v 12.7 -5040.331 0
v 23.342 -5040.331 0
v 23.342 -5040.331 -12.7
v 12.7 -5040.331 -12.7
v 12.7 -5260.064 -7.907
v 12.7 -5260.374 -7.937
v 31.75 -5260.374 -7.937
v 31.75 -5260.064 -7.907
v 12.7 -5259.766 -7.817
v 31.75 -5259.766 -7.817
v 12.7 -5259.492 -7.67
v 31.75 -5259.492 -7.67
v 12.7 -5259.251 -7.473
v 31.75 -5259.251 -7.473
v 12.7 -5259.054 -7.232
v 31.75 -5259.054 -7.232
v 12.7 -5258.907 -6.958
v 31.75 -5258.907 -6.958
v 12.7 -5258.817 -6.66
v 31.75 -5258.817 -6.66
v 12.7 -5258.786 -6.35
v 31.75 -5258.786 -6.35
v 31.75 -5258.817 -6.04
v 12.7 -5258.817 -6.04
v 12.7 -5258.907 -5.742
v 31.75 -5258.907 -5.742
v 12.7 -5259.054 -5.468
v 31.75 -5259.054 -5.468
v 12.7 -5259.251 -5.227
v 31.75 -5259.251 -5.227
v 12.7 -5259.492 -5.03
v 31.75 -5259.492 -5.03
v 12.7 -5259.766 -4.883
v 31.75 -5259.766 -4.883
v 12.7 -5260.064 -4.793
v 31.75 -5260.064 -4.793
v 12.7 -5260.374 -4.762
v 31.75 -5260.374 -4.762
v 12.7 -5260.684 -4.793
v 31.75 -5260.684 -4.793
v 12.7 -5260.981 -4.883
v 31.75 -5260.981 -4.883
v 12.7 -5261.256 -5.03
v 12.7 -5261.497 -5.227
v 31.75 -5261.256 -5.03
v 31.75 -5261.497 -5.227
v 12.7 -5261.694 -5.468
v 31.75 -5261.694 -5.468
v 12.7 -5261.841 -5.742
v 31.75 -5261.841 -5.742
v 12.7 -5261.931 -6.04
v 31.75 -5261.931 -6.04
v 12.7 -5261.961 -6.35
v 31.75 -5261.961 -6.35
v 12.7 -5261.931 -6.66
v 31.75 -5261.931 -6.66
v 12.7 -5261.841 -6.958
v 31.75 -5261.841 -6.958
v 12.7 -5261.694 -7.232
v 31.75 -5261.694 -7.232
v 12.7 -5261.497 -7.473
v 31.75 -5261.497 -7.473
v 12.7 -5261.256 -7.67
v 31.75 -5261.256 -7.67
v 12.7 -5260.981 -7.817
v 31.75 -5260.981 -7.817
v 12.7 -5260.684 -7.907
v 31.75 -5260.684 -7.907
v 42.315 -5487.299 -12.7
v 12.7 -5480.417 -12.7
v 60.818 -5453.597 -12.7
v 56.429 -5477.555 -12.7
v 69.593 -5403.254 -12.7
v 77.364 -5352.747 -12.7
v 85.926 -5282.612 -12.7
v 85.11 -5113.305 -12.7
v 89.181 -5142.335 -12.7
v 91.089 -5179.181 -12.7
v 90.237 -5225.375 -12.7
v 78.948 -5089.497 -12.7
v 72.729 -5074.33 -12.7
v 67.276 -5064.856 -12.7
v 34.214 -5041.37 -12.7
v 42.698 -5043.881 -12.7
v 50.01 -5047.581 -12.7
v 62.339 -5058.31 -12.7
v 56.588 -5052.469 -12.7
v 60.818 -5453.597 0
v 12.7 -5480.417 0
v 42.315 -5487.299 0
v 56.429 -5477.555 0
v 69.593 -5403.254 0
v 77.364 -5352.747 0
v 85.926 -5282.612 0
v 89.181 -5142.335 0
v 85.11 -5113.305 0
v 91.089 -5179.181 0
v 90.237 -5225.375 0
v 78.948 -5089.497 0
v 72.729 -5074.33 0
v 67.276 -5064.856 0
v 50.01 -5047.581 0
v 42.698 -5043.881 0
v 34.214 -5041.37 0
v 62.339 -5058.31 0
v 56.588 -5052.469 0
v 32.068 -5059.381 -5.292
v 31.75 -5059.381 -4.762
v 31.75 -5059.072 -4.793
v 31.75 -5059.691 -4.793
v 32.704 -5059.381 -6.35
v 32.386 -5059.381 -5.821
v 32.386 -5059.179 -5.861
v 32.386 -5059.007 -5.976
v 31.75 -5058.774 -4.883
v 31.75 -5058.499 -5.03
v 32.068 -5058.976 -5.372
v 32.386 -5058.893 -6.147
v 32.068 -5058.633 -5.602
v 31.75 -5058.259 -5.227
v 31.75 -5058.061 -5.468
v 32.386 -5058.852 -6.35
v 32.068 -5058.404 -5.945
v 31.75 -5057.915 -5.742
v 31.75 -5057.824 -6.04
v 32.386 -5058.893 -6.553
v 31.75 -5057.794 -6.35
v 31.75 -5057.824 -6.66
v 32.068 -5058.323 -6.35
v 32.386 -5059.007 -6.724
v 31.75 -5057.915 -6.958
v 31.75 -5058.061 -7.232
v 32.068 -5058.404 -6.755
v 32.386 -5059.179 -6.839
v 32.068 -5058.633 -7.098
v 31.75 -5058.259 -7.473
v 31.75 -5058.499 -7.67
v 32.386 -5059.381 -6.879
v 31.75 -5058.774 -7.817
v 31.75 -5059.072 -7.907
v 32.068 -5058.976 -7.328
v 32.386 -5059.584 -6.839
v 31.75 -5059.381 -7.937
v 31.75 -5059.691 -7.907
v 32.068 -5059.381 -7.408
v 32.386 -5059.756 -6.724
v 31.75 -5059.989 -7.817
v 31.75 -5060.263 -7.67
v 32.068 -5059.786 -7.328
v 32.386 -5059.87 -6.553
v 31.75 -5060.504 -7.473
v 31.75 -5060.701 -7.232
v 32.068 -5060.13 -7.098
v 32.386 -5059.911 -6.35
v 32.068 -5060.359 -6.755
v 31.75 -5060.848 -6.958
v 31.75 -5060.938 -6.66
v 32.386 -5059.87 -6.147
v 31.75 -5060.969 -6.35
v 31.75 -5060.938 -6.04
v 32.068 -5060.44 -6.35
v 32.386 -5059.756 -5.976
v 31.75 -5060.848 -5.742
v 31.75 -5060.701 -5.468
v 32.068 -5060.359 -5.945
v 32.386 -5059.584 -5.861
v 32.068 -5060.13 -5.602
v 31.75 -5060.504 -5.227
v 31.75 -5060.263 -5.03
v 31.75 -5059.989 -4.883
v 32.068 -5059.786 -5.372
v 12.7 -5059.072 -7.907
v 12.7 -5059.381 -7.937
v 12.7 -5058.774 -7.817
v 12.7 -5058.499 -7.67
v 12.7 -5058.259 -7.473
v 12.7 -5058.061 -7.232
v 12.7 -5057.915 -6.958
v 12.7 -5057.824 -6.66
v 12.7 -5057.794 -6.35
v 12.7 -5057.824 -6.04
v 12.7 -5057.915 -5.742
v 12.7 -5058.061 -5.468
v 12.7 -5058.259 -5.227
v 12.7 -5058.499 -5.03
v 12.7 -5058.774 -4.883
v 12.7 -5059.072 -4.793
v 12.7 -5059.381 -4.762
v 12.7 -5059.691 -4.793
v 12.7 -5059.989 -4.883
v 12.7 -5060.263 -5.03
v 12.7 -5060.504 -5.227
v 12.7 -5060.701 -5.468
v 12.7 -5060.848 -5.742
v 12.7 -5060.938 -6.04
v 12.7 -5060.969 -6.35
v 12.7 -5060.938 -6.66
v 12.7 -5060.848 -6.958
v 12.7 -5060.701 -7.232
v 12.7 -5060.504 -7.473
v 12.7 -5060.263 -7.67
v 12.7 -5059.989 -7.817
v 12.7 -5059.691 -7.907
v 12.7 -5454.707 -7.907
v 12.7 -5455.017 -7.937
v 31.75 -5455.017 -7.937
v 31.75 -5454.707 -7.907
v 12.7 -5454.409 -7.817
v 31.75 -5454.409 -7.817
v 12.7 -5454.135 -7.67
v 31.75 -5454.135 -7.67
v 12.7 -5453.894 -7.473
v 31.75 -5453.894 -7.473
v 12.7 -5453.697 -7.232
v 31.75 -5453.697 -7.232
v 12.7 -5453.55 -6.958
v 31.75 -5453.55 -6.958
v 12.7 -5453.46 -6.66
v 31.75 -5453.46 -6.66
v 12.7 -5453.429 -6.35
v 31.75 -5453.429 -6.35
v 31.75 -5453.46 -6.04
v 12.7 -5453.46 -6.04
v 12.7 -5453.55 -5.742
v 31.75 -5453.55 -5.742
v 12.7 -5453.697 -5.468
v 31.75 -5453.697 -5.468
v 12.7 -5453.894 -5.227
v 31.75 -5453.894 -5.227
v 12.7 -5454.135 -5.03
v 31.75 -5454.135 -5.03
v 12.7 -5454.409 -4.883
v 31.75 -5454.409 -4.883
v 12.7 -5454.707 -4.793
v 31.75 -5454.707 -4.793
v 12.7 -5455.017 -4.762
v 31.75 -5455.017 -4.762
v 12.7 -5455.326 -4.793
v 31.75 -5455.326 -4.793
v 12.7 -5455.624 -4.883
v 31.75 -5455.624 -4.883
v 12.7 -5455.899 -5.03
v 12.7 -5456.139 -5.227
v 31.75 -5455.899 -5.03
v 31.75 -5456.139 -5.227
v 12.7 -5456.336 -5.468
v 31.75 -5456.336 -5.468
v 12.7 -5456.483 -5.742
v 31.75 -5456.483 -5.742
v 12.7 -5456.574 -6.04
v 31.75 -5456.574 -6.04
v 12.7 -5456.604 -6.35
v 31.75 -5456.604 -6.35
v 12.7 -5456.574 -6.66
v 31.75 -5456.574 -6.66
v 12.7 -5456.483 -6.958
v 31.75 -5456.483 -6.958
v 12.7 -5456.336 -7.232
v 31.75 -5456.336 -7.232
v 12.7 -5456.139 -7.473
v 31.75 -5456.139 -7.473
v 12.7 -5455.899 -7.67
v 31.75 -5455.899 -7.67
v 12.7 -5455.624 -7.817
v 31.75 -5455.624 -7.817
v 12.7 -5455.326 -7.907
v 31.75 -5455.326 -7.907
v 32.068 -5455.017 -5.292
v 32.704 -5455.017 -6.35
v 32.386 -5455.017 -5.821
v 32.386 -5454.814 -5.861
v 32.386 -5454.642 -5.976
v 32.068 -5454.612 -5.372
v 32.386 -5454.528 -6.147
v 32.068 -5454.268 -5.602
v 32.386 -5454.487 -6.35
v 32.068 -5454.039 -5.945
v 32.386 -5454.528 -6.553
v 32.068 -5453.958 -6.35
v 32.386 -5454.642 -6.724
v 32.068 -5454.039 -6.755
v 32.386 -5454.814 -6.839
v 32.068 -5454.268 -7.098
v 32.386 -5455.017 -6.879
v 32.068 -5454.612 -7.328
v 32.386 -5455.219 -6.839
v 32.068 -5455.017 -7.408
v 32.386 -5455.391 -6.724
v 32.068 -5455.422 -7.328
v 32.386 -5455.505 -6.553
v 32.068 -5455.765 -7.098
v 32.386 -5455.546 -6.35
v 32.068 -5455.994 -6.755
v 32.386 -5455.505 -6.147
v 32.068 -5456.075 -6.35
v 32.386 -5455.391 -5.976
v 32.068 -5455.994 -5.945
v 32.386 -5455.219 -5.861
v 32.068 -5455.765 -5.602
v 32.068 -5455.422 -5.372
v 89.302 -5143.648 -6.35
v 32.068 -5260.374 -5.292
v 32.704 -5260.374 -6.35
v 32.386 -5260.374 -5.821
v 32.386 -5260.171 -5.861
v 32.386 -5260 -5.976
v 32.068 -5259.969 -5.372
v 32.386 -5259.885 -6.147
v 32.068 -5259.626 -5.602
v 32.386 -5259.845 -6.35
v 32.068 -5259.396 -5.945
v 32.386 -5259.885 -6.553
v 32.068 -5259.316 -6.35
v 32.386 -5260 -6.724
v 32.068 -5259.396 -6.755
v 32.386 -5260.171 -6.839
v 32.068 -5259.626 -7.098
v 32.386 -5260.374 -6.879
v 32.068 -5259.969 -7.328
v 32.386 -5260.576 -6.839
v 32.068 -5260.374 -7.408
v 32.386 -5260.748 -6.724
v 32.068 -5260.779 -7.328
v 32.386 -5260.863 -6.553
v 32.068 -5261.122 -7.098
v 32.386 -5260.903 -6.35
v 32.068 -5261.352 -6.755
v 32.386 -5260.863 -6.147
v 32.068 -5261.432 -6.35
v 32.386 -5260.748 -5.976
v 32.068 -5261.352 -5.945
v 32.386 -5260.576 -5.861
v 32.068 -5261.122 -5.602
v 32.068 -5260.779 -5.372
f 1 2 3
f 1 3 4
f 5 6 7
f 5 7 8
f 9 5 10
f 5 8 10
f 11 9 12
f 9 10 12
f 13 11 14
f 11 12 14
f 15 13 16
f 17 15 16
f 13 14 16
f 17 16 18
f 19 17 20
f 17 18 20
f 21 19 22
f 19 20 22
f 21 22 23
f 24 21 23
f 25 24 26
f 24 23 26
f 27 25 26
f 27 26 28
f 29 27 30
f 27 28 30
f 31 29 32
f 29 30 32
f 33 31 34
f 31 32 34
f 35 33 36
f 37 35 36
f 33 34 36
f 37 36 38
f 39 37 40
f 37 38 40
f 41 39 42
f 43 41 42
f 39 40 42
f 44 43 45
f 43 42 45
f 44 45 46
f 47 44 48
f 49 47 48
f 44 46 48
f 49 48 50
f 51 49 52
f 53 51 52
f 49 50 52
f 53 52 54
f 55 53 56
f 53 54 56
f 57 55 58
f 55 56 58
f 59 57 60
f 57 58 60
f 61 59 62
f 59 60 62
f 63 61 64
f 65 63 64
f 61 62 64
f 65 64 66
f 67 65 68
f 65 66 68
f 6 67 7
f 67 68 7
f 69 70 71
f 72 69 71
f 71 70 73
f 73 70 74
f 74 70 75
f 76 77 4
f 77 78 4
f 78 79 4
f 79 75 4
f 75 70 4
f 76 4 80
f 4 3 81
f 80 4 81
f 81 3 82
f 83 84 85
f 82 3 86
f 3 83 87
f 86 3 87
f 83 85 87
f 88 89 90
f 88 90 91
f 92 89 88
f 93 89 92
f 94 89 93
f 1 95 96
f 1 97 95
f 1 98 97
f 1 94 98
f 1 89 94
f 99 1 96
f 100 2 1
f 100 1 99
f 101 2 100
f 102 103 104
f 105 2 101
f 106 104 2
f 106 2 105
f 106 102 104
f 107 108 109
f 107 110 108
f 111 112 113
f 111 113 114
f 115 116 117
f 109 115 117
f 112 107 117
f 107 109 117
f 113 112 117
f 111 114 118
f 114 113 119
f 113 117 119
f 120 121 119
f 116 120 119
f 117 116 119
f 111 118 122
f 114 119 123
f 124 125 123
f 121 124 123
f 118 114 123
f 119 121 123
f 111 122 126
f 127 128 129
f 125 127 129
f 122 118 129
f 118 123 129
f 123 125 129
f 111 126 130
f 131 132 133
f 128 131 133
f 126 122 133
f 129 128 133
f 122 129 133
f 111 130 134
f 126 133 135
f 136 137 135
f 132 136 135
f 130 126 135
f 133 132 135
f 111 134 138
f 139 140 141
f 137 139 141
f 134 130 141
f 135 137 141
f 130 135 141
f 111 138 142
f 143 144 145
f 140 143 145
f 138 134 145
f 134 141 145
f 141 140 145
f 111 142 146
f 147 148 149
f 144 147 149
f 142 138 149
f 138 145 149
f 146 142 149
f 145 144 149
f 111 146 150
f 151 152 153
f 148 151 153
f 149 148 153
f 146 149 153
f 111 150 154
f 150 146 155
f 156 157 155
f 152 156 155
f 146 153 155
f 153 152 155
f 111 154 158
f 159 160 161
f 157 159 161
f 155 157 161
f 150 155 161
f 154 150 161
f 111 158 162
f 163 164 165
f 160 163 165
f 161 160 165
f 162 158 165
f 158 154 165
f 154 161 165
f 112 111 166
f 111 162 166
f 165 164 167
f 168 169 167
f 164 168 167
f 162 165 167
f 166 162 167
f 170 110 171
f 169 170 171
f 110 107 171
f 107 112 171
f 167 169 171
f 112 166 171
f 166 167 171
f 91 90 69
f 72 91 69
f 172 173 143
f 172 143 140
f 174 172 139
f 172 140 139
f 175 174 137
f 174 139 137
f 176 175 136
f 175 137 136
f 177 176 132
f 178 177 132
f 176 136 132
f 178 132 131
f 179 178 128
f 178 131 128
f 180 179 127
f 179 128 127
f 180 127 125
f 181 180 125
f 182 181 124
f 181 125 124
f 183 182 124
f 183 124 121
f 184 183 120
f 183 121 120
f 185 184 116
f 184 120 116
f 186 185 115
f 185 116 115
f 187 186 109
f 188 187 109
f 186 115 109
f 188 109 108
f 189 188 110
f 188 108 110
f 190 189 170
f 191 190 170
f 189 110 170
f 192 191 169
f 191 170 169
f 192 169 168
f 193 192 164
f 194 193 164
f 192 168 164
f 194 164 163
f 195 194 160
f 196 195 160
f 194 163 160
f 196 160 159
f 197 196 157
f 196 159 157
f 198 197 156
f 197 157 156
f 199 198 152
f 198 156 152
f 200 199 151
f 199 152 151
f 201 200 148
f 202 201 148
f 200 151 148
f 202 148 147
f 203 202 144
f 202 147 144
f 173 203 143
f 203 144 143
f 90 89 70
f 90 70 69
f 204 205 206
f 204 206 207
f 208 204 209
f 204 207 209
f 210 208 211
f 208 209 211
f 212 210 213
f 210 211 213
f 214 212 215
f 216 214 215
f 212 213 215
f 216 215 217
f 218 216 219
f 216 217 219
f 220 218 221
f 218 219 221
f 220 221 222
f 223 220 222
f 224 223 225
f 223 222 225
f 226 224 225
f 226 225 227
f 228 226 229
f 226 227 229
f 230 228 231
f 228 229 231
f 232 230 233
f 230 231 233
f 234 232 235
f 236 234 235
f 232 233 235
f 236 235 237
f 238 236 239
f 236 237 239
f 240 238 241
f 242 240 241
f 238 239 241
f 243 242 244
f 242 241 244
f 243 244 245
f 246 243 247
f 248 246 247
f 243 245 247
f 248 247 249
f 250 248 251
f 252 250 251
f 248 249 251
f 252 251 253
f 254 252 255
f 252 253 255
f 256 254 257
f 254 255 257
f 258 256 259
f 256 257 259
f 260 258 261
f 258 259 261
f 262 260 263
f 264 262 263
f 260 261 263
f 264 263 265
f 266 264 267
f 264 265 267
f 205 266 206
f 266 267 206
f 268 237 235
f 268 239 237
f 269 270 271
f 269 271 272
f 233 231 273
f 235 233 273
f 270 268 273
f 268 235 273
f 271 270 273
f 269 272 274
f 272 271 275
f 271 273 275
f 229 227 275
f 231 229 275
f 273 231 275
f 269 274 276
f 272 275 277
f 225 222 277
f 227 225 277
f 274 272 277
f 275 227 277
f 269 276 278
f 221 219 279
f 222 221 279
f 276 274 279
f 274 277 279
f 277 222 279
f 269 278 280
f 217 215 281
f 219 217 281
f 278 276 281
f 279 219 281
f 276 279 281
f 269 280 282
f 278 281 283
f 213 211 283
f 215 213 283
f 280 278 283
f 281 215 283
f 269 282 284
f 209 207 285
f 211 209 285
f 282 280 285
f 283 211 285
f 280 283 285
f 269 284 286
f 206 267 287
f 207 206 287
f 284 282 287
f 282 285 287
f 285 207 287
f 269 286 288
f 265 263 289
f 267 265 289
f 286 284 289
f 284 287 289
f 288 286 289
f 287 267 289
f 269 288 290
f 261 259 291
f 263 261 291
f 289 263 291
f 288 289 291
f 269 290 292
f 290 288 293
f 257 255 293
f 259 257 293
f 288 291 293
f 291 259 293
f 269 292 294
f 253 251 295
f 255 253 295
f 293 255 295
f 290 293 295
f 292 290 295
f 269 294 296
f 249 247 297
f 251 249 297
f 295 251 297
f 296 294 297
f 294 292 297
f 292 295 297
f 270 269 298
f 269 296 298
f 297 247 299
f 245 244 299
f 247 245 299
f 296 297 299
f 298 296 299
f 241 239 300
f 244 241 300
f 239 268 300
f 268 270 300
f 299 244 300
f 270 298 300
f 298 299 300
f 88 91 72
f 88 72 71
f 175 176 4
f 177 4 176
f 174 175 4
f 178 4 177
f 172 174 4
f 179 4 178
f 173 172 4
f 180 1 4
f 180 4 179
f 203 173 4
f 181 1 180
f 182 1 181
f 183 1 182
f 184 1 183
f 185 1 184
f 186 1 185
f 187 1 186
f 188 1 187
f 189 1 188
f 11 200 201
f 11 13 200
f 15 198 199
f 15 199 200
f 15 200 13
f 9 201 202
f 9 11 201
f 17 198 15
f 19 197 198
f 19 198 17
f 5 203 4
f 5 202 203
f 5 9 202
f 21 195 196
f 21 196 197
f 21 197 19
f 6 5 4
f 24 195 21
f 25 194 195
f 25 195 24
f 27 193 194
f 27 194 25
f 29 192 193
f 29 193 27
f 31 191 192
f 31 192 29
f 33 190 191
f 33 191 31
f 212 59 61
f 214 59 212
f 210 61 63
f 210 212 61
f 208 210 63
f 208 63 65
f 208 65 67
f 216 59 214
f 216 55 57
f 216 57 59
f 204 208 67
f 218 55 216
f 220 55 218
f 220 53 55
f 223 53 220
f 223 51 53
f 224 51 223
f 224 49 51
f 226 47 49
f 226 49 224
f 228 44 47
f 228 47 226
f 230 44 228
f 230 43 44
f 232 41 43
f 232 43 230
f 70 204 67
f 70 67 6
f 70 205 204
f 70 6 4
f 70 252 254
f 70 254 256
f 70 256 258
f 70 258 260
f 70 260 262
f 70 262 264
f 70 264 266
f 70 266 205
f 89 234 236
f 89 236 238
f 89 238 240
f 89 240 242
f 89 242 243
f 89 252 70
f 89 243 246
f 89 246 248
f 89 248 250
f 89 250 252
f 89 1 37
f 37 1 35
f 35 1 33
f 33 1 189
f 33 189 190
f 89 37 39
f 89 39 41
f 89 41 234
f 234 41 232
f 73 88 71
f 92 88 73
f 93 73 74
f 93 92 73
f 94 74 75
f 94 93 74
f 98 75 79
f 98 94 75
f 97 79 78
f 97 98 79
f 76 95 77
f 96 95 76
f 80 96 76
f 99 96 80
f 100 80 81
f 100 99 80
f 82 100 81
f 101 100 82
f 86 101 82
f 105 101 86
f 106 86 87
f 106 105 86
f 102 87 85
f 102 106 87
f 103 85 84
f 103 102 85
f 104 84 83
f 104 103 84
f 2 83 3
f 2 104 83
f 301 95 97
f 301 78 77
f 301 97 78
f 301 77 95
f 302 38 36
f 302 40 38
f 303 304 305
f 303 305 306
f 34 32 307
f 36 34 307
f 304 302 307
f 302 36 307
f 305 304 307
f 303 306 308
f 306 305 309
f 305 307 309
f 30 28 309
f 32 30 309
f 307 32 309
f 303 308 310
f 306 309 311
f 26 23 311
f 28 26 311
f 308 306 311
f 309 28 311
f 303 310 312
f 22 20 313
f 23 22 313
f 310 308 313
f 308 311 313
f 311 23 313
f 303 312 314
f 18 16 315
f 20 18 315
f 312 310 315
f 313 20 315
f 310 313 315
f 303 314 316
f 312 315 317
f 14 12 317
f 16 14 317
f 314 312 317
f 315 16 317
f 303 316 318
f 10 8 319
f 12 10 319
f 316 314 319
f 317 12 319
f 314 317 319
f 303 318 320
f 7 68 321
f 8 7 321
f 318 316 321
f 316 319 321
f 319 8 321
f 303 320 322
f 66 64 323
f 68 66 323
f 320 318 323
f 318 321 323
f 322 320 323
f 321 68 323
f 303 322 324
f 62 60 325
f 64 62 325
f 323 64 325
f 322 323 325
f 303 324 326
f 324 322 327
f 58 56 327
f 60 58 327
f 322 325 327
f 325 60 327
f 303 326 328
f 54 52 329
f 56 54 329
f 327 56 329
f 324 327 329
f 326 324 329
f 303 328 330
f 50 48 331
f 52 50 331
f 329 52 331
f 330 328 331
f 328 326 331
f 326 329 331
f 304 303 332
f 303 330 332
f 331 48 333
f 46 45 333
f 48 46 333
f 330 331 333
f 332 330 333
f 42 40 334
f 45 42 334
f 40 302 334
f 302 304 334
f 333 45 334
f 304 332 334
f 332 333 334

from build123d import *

# Parameters (mm, degrees)
BOSS_EXTRUDE1_DEPTH = 12.7
CHAMFER1_SIZE       = 12.7
CHAMFER1_SIZE2      = 12.14102868
HOLE1_D             = 3.175
HOLE1_DEPTH         = 50.8
HOLE1_CSINK_D       = 10.16
HOLE1_CSINK_ANGLE   = 82
HOLE1_TIP           = 0.953866233


with BuildPart() as part:
    # Sketch2 → Boss-Extrude1 (new body)
    with BuildSketch(Plane.XY):
        Polygon((12.7, -5480.416534997), (54.140557785, -5490.047588702), (136.525, -5040.331407449), (12.7, -5040.331407449), align=None)
    extrude(amount=-BOSS_EXTRUDE1_DEPTH)

    # Fillet1
    # a fillet whose section is not a circle: 406.4, 38.1 mm, written as the material it takes off along each edge
    with BuildSketch(Plane(origin=(136.525, -5040.331407449, 1050.356508865), x_dir=(-0.18019344316526936, -0.9836311925921447, 0), z_dir=(0, 0, -1))) as fillet1_piece_1:
        with BuildLine():
            Bezier((420.142603546, 0), (0, 0), (20.394886876, 111.330615302), weights=[1, 1, 1])
            Line((20.394886876, 111.330615302), (0, 0))
            Line((0, 0), (420.142603546, 0))
        make_face()
    extrude(amount=2113.413017729, mode=Mode.SUBTRACT)

    # Chamfer1
    chamfer1_edges = [part.edges().sort_by_distance(p)[0] for p in [
        (54.140557785, -5490.047588702, -6.35),
    ]]
    chamfer1_side = [part.faces().sort_by_distance(p)[0] for p in [
        (57.479307716, -5471.822183168, -6.35),
    ]]
    chamfer(chamfer1_edges, length=CHAMFER1_SIZE, length2=CHAMFER1_SIZE2, reference=chamfer1_side[0])

    # Hole1
    with Locations(Plane(origin=(-19.05, -5578.323279584, -94.73946), x_dir=(0, 0, 1), z_dir=(-1, 0, 0))):
        with Locations((218.563766336, 102.817509219), (218.563766336, 48.504773219), (202.68946, 123.306744588), (202.68946, 317.949308361), (202.68946, 518.941872135), (88.38946, 518.941872135), (88.38946, 317.949308361), (88.38946, 123.306744588), (104.263766336, 216.849631358), (104.263766336, 132.677202288), (104.263766336, 48.504773219), (-104.263766336, 48.504773219), (-104.263766336, 132.677202288), (-104.263766336, 216.849631358), (-88.38946, 123.306744588), (-88.38946, 317.949308361), (-88.38946, 518.941872135), (-202.68946, 518.941872135), (-202.68946, 317.949308361), (-202.68946, 123.306744588), (-218.563766336, 48.504773219), (-218.563766336, 102.817509219)):
            CounterSinkHole(HOLE1_D / 2, HOLE1_CSINK_D / 2, depth=HOLE1_DEPTH, counter_sink_angle=HOLE1_CSINK_ANGLE)
            with Locations((0, 0, -(HOLE1_DEPTH + HOLE1_TIP / 2))):  # 118° drill point
                Cone(0, HOLE1_D / 2, HOLE1_TIP, mode=Mode.SUBTRACT)


solid = part.part
